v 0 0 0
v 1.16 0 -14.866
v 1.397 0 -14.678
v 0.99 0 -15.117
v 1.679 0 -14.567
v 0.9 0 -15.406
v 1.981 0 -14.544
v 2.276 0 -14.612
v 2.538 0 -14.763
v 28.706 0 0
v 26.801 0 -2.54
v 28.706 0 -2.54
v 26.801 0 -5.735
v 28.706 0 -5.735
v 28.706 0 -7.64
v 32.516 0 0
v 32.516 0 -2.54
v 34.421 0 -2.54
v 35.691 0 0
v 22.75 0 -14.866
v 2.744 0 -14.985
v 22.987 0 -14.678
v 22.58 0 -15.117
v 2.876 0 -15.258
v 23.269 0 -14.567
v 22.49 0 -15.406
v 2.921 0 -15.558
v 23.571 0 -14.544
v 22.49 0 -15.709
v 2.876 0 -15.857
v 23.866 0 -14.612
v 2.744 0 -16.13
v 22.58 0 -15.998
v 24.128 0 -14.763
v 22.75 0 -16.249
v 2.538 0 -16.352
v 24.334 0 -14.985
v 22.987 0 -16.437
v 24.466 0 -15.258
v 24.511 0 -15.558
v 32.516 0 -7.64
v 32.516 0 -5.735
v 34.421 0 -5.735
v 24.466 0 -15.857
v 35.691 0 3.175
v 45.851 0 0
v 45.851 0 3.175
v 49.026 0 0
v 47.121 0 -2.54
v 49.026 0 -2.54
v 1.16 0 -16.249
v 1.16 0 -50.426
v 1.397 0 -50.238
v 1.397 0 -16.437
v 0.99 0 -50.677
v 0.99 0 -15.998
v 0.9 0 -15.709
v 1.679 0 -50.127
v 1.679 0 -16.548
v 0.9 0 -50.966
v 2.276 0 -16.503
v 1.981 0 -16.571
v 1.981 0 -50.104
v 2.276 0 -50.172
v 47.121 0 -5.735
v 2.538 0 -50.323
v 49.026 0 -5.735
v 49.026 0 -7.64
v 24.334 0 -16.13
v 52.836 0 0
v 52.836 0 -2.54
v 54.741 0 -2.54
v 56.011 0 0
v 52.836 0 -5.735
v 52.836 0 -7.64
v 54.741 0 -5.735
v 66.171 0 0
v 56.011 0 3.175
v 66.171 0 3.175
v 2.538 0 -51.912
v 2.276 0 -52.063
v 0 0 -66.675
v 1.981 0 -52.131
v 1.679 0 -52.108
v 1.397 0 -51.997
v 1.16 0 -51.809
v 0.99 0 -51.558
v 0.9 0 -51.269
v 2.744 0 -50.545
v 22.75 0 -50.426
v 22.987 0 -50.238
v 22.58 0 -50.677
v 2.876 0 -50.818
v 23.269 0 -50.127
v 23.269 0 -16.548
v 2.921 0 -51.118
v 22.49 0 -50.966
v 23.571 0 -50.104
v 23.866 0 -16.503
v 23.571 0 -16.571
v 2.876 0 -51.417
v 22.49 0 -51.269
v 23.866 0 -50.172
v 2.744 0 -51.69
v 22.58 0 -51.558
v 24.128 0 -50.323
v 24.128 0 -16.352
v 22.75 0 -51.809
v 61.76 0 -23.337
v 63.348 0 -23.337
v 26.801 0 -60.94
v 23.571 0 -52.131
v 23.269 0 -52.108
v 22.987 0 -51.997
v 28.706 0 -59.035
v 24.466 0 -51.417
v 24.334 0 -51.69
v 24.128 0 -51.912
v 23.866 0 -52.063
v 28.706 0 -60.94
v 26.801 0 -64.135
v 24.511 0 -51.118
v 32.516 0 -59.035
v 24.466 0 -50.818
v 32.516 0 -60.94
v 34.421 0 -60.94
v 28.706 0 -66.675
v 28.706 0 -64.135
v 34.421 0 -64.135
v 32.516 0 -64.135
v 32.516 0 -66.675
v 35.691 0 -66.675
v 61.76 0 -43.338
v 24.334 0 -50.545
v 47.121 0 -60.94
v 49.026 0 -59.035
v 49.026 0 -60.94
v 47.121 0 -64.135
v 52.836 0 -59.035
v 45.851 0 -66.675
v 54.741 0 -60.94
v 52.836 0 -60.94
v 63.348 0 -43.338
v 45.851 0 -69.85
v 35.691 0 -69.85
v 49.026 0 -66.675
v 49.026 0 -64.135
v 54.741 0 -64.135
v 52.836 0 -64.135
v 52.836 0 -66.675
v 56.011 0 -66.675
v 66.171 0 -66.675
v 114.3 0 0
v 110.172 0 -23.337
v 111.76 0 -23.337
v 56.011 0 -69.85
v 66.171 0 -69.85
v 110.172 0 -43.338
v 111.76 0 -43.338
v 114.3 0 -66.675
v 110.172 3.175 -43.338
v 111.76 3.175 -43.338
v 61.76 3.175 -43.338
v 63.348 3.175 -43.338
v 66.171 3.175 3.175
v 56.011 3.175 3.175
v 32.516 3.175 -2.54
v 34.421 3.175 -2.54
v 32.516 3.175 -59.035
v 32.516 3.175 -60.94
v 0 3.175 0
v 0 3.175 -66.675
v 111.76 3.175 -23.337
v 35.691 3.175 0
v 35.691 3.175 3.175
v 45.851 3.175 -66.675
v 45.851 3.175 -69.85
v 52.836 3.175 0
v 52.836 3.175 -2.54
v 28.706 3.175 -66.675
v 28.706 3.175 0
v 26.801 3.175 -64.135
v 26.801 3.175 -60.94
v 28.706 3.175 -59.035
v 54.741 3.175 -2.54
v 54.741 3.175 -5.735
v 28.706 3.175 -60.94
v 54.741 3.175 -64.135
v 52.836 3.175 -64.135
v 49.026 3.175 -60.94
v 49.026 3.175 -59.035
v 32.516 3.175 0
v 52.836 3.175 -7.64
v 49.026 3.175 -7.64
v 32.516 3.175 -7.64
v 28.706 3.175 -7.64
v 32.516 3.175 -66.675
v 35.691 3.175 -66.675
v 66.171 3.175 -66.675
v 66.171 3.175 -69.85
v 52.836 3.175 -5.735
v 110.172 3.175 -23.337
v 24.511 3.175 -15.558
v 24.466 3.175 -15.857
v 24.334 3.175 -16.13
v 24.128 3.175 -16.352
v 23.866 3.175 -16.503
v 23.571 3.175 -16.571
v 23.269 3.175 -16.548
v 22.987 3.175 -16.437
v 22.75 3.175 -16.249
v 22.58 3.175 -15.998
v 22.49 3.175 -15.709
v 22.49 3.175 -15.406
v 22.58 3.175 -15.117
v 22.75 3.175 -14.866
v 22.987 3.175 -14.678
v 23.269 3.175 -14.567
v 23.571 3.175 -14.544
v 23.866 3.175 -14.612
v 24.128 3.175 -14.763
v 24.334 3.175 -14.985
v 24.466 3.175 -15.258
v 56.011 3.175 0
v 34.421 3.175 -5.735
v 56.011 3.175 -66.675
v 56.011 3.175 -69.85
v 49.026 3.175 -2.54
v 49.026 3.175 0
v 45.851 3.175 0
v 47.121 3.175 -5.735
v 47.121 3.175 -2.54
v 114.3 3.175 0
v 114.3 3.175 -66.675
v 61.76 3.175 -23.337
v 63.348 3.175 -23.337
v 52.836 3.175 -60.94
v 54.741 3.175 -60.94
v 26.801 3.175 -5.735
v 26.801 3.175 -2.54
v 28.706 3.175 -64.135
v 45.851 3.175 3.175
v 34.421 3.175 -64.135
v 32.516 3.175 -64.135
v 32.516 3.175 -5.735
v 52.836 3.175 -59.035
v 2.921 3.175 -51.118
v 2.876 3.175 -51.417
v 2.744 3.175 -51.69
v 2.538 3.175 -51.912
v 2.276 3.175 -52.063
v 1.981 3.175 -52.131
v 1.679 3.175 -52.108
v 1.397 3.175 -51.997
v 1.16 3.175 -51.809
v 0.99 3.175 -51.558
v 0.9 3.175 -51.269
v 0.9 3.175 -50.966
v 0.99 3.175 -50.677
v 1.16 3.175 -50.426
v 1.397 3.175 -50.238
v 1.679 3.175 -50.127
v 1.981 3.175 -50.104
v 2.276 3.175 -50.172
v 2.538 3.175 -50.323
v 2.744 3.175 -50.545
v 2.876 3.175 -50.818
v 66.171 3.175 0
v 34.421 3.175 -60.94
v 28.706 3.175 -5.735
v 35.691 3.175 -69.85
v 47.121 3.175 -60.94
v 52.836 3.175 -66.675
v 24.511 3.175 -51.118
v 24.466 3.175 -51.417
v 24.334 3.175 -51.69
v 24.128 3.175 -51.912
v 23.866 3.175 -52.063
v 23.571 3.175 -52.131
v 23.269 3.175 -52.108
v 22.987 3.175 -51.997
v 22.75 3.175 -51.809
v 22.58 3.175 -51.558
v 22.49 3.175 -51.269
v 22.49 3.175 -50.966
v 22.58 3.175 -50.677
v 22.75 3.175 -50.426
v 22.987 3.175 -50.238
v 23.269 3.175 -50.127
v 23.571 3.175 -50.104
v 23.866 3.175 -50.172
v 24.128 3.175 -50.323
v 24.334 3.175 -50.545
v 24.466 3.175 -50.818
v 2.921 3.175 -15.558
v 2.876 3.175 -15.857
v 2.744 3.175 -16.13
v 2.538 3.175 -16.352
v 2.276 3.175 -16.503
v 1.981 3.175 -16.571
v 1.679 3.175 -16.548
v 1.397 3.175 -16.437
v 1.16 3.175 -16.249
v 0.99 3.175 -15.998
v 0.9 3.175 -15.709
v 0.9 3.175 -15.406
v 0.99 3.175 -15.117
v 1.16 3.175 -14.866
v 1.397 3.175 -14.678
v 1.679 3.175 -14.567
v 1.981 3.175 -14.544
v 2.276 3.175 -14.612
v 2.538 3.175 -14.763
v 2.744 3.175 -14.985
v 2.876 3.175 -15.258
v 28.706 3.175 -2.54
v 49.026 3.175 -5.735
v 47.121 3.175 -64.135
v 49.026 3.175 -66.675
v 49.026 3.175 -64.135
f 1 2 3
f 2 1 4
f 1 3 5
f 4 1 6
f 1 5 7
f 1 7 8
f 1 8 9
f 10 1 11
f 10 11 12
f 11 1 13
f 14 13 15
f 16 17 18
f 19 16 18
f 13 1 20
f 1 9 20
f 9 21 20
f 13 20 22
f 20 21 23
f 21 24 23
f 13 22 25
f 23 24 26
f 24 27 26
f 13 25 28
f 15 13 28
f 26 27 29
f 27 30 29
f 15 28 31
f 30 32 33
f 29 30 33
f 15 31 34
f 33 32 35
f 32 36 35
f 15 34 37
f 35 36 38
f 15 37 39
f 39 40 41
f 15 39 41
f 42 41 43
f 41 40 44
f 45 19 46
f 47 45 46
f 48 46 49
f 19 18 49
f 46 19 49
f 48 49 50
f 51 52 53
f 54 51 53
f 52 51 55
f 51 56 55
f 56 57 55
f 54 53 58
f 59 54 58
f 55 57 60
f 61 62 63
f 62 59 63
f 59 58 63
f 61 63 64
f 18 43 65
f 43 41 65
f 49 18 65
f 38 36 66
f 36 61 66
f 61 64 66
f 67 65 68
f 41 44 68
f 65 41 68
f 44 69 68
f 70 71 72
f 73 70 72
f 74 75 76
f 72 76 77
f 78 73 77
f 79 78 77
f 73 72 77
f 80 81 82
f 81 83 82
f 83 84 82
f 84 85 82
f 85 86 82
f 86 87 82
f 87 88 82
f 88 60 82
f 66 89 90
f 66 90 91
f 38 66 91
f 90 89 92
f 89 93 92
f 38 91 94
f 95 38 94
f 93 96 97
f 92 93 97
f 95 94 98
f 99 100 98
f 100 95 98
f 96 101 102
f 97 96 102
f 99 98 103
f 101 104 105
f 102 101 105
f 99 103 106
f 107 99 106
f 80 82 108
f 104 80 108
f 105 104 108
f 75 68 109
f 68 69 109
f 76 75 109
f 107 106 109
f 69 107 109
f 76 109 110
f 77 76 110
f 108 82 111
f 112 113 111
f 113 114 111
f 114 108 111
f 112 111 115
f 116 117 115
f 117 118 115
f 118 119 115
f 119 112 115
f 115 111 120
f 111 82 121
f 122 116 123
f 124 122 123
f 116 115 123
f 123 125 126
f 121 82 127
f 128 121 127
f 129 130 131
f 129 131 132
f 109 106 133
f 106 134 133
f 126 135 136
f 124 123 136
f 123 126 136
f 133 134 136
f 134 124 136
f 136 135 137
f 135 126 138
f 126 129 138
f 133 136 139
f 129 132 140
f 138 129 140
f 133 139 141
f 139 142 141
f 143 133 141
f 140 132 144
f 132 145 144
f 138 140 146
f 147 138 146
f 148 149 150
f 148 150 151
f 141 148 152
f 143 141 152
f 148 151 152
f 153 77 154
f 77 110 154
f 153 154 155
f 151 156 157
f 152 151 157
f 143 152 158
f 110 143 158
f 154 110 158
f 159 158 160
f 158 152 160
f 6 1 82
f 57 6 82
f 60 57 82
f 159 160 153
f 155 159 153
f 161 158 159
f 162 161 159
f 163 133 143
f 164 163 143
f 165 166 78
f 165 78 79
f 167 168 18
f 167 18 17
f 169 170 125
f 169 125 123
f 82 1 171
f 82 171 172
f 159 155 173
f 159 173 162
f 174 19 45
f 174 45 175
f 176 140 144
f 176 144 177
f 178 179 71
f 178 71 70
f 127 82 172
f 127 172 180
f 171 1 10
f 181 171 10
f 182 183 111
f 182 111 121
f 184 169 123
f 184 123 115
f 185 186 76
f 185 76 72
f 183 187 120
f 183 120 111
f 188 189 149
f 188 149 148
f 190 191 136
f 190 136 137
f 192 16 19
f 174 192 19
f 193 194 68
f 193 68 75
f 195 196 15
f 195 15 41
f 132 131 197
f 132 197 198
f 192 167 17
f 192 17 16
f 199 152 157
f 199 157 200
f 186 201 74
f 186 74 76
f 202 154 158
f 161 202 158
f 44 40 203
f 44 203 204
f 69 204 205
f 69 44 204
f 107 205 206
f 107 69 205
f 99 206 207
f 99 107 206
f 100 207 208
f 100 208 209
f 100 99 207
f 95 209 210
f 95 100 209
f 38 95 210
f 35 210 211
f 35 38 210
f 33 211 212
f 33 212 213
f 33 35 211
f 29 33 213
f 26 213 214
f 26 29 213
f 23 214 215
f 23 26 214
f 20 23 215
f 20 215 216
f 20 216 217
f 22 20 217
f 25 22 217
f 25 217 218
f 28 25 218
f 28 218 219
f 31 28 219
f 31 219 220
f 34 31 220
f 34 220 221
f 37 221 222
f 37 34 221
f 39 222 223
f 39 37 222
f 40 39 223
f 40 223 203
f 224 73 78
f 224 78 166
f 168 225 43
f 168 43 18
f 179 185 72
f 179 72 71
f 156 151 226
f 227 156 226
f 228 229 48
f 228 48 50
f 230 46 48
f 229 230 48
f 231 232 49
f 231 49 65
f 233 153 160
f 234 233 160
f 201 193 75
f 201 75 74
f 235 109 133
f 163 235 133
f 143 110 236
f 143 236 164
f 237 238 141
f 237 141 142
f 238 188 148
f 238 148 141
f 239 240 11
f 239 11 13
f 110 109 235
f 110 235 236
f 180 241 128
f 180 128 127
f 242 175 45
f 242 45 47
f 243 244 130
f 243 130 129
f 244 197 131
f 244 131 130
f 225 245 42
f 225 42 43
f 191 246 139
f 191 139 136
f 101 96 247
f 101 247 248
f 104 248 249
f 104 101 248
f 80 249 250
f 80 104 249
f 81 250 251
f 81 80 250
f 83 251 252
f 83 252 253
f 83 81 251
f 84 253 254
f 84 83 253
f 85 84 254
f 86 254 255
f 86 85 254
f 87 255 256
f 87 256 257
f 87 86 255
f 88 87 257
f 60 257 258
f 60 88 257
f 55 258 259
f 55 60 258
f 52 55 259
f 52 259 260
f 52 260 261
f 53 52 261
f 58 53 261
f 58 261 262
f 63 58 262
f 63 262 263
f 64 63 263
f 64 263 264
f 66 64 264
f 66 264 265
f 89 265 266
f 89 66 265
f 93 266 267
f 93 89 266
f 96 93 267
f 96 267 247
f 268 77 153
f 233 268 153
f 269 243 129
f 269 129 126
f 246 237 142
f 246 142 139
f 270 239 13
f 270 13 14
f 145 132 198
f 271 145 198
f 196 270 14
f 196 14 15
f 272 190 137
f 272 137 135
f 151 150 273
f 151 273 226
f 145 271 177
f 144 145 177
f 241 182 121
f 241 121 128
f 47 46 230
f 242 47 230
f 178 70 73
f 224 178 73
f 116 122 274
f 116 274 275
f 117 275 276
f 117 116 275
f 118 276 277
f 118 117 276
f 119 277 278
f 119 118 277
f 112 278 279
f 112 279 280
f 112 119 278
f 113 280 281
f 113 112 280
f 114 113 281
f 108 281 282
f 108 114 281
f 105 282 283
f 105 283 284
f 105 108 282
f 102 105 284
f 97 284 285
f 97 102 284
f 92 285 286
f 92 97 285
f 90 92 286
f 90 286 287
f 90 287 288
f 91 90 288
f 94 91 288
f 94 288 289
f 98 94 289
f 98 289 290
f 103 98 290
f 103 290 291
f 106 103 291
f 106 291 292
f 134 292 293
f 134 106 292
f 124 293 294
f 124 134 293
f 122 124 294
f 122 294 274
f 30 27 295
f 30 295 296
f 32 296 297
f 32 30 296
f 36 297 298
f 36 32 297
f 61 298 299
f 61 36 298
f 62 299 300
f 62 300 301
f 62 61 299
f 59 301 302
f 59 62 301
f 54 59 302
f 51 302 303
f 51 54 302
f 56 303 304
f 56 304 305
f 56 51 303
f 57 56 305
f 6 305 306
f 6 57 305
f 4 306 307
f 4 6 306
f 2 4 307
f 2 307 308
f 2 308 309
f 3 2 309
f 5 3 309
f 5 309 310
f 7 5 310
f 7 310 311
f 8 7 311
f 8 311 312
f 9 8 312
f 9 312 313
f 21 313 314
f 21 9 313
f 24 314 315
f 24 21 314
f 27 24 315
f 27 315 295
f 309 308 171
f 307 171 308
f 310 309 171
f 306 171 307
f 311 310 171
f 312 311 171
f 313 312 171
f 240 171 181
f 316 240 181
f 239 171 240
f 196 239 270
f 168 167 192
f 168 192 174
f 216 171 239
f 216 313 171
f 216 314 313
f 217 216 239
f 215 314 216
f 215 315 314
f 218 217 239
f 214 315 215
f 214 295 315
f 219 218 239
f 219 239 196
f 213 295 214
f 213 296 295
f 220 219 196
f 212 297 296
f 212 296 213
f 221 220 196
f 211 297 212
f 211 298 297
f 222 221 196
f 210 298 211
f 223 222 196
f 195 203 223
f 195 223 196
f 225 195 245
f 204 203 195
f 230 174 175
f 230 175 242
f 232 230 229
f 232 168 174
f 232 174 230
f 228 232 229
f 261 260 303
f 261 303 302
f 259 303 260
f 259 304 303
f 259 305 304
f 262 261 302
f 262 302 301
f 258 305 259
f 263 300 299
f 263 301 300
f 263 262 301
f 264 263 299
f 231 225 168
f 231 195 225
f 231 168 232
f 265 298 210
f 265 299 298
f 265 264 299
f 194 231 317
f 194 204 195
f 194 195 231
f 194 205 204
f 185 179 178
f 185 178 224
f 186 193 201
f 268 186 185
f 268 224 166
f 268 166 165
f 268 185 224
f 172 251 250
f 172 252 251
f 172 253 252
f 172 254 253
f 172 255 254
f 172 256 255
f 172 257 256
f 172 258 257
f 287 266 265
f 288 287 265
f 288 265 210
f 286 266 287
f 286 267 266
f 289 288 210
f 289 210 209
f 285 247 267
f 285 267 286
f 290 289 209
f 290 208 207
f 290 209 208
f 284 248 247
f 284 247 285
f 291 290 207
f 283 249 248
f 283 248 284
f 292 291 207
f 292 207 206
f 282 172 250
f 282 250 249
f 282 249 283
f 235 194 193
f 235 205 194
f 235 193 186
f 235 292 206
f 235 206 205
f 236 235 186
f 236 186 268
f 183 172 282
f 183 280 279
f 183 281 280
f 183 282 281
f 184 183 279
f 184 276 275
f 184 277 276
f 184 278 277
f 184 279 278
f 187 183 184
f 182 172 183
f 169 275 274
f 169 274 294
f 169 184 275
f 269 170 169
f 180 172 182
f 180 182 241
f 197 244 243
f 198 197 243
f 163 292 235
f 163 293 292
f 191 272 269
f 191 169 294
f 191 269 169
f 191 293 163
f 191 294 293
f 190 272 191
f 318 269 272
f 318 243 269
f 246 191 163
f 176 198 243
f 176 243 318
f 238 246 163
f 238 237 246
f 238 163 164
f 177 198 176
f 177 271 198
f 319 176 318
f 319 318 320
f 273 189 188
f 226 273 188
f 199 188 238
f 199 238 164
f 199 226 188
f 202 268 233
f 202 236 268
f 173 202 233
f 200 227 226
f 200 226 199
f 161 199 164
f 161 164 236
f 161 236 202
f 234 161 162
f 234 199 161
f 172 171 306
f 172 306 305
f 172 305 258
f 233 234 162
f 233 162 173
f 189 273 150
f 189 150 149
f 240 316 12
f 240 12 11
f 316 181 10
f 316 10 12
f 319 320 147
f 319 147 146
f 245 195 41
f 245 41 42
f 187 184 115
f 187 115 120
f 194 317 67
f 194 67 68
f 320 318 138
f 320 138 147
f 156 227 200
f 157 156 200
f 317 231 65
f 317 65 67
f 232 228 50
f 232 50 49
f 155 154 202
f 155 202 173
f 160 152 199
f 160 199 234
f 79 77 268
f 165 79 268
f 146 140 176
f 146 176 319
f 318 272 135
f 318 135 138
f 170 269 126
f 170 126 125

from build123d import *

# Parameters (mm, degrees)
SKETCH1_W           = 114.3
SKETCH1_H           = 66.675
SKETCH1_R           = 1.016
SKETCH1_W_2         = 1.5875
SKETCH1_H_2         = 20.0000108
BOSS_EXTRUDE1_DEPTH = 3.175
SKETCH2_W           = 10.16
SKETCH2_H           = 3.175
BOSS_EXTRUDE3_DEPTH = 3.175
CUT_EXTRUDE1_DEPTH  = 3.175


with BuildPart() as part:
    # Sketch1 → Boss-Extrude1 (new body)
    with BuildSketch(Plane(origin=(0, 0, 0), x_dir=(1, 0, 0), z_dir=(0, 1, 0))):
        with Locations((57.15, 33.3375)):
            Rectangle(SKETCH1_W, SKETCH1_H)
        with Locations((1.905, 15.5575)):
            Circle(SKETCH1_R, mode=Mode.SUBTRACT)
        with Locations((23.495, 15.5575)):
            Circle(SKETCH1_R, mode=Mode.SUBTRACT)
        with Locations((23.495, 51.1175)):
            Circle(SKETCH1_R, mode=Mode.SUBTRACT)
        with Locations((1.905, 51.1175)):
            Circle(SKETCH1_R, mode=Mode.SUBTRACT)
        with Locations((110.96625, 33.3375)):
            Rectangle(SKETCH1_W_2, SKETCH1_H_2, mode=Mode.SUBTRACT)
        with Locations((62.55385, 33.3375)):
            Rectangle(SKETCH1_W_2, SKETCH1_H_2, mode=Mode.SUBTRACT)
    extrude(amount=BOSS_EXTRUDE1_DEPTH)

    # Sketch2 → Boss-Extrude3 (add)
    with BuildSketch(Plane.XY):
        with Locations((40.770613131, 1.5875)):
            Rectangle(SKETCH2_W, SKETCH2_H)
        with Locations((61.090613131, 1.5875)):
            Rectangle(SKETCH2_W, SKETCH2_H)
    boss_extrude3 = extrude(amount=BOSS_EXTRUDE3_DEPTH)

    # Mirror2: Boss-Extrude3 across plane
    add(boss_extrude3.mirror(Plane(origin=(0, 3.175, -33.3375), x_dir=(1, 0, 0), z_dir=(0, 0, -1))))

    # Sketch4 → Cut-Extrude1 (cut)
    with BuildSketch(Plane(origin=(0, 3.175, 0), x_dir=(1, 0, 0), z_dir=(0, 1, 0))):
        Polygon((28.705613131, 0), (28.705613131, 2.54), (26.800613131, 2.54), (26.800613131, 5.73532), (28.705613131, 5.73532), (28.705613131, 7.64032), (32.515613131, 7.64032), (32.515613131, 5.73532), (34.420613131, 5.73532), (34.420613131, 2.54), (32.515613131, 2.54), (32.515613131, 0), align=None)
        Polygon((49.025613131, 0), (49.025613131, 2.54), (47.120613131, 2.54), (47.120613131, 5.73532), (49.025613131, 5.73532), (49.025613131, 7.64032), (52.835613131, 7.64032), (52.835613131, 5.73532), (54.740613131, 5.73532), (54.740613131, 2.54), (52.835613131, 2.54), (52.835613131, 0), align=None)
        Polygon((52.835613131, 66.675), (52.835613131, 64.135), (54.740613131, 64.135), (54.740613131, 60.93968), (52.835613131, 60.93968), (52.835613131, 59.03468), (49.025613131, 59.03468), (49.025613131, 60.93968), (47.120613131, 60.93968), (47.120613131, 64.135), (49.025613131, 64.135), (49.025613131, 66.675), align=None)
        Polygon((32.515613131, 66.675), (32.515613131, 64.135), (34.420613131, 64.135), (34.420613131, 60.93968), (32.515613131, 60.93968), (32.515613131, 59.03468), (28.705613131, 59.03468), (28.705613131, 60.93968), (26.800613131, 60.93968), (26.800613131, 64.135), (28.705613131, 64.135), (28.705613131, 66.675), align=None)
    extrude(amount=-CUT_EXTRUDE1_DEPTH, mode=Mode.SUBTRACT)


solid = part.part
